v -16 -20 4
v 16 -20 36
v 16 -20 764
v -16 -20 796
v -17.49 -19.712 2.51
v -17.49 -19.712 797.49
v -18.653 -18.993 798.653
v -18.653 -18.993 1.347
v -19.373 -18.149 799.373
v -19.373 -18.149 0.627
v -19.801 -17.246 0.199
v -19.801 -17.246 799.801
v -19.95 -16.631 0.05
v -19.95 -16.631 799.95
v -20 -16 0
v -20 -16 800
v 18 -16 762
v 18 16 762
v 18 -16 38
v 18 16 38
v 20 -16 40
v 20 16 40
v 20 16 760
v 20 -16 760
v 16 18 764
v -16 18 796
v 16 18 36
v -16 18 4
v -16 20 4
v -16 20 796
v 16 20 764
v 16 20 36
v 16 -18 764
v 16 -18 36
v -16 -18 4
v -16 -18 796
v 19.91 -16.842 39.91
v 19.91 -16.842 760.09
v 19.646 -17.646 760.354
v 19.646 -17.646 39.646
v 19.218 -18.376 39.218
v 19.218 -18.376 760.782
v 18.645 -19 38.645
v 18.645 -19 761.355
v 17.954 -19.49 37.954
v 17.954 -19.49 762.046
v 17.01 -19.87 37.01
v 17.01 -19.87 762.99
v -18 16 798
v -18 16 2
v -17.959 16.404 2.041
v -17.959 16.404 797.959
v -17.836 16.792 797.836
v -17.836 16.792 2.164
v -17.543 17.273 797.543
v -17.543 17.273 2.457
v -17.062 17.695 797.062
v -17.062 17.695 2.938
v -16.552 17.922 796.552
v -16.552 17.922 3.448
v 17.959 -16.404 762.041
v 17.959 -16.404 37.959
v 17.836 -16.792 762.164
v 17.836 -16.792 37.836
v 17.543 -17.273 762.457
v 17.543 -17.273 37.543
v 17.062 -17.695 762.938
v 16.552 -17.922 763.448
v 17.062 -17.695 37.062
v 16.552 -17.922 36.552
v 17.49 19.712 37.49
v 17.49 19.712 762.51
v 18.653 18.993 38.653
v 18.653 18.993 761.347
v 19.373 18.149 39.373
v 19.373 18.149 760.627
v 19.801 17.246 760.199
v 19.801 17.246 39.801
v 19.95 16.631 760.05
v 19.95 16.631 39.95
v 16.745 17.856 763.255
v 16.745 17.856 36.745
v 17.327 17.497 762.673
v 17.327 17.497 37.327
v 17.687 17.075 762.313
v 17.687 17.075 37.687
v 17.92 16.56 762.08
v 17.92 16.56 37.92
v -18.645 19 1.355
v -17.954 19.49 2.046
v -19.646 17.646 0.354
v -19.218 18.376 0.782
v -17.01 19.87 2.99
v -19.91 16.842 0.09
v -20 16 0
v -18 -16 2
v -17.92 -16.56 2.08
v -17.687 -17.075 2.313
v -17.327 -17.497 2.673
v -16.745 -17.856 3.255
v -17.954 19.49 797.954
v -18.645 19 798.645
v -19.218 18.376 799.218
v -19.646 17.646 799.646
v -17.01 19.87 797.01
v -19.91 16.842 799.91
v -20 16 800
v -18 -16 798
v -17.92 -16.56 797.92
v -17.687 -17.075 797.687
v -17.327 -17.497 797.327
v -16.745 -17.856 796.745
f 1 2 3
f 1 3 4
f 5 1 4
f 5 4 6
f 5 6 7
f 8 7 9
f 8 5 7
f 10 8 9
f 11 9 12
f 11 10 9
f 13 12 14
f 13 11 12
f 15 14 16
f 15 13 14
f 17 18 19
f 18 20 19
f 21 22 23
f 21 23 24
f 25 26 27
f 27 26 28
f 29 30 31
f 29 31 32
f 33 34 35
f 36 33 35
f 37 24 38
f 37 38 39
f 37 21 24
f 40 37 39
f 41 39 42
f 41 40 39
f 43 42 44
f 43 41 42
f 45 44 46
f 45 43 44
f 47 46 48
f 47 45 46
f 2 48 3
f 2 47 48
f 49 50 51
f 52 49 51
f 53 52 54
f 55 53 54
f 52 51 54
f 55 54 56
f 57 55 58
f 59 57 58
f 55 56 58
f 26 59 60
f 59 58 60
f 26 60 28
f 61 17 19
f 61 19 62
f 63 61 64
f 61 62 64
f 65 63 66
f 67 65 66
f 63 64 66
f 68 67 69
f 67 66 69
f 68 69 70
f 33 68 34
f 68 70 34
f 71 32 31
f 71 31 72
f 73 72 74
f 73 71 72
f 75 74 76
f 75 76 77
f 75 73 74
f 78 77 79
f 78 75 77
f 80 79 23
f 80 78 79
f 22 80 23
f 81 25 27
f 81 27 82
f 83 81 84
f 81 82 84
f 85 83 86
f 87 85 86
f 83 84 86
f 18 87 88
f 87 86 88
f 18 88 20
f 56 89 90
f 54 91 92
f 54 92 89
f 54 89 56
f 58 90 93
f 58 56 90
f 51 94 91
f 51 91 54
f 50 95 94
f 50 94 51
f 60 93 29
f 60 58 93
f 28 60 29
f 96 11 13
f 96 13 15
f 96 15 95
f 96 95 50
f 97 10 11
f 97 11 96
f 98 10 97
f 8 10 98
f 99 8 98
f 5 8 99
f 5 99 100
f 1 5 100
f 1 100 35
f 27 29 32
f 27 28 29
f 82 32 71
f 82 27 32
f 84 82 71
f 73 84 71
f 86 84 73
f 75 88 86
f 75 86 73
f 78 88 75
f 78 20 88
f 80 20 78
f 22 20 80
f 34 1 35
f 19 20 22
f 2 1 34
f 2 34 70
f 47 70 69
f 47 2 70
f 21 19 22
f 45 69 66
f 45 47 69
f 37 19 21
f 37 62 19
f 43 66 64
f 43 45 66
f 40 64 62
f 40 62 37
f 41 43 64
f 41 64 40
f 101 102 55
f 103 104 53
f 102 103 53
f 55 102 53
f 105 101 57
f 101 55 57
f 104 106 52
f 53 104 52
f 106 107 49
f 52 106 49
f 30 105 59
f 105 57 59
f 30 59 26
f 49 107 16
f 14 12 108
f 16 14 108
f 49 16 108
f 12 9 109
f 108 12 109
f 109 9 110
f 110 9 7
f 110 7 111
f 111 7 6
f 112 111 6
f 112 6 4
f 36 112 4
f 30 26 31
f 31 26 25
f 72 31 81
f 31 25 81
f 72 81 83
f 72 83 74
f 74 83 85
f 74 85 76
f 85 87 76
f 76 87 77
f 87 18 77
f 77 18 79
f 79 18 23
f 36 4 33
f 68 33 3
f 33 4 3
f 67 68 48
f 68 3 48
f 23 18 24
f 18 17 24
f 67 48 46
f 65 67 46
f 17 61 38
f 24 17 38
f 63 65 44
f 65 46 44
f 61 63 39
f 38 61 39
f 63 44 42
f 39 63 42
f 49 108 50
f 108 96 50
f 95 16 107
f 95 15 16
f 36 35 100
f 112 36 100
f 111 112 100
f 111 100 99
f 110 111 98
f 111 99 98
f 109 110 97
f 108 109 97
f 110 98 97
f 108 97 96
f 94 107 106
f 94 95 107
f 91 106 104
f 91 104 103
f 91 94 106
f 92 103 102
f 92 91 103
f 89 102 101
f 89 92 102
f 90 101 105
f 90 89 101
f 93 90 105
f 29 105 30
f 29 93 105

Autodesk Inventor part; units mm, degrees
ref_plane "YZ Plane" through (0, 0, 0) normal (1, 0, 0) x (0, 1, 0)
ref_plane "Piano iniziale" through (0, 0, 0) normal (0, 0, 1) x (1, 0, 0)
ref_plane "Piano finale" through (0, 0, 800) normal (0, 0, 1) x (1, 0, 0)
sketch "Schizzo" plane through (0, 0, 0) normal (0, 0, 1) x (1, 0, 0)
  line L0 (-20, -16) -> (-20, 16)
  line L1 (-16, 20) -> (16, 20)
  line L2 (20, 16) -> (20, -16)
  line L3 (16, -20) -> (-16, -20)
  arc A0 (-20, -16) -> (-16, -20) centre (-16, -16) ccw
  arc A1 (20, 16) -> (16, 20) centre (16, 16) ccw
  arc A2 (-16, 20) -> (-20, 16) centre (-16, 16) ccw
  arc A3 (16, -20) -> (20, -16) centre (16, -16) ccw
  arc A4 (-16, 18) -> (-18, 16) centre (-16, 16) ccw
  line L4 (-16, 18) -> (16, 18)
  arc A5 (18, 16) -> (16, 18) centre (16, 16) ccw
  line L5 (18, 16) -> (18, -16)
  arc A6 (16, -18) -> (18, -16) centre (16, -16) ccw
  line L6 (16, -18) -> (-16, -18)
  arc A7 (-18, -16) -> (-16, -18) centre (-16, -16) ccw
  line L7 (-18, -16) -> (-18, 16)
  line L8 (0, 29.1598) -> (0, -29.1598) construction
  line L9 (-29.1598, 0) -> (29.1598, 0) construction
  dimension "d7" = 4
  dimension "d9" = 40
  dimension "d11" = 40
  dimension "d12" = 2
  dimension "d15" = 20
  dimension "d16" = 20
extrude "Corpo" add sketch "Schizzo" along normal up to surface (800 mm away) from surface at 0
sketch "Sketch3" plane through (0, 0, 0) normal (0, 0, 1) x (1, 0, 0)
  line L0 (0, 0) -> (10, 0)
ref_plane "Work Plane3" through (0, 0, 0) normal (0, -1, 0) x (1, 0, 0)
sketch "Sketch4" plane through (0, 0, 0) normal (0, -1, 0) x (1, 0, 0)
  line L0 (-2, 0) -> (12, 0)
  line L1 (-2, 800) -> (12, 800)
  dimension "d18" = 800
sketch "Schizzo5" plane through (-16, -20, 0) normal (0, -1, 0) x (1, 0, 0)
  line L0 (-4, 0) -> (-4, 800) projected
  line L1 (-4, 0) -> (0, 0) projected
  line L2 (-4, 800) -> (0, 800) projected
  line L3 (-4, 800) -> (0, 800) projected
  line L4 (-4, 800) -> (46.6766, 749.3234)
  line L5 (-4, 800) -> (67.6675, 800) construction
  line L6 (46.6766, 749.3234) -> (46.6766, 833.8871)
  line L7 (46.6766, 833.8871) -> (-4, 800)
  line L8 (-4, 0) -> (55.8193, 59.8193)
  line L9 (-4, 0) -> (80.5973, 0) construction
  line L10 (55.8193, 59.8193) -> (55.8193, -51.0015)
  line L11 (55.8193, -51.0015) -> (-4, 0)
  point P0 (16, 0)
  dimension "d19" = 45
  dimension "d20" = 45
extrude "Estrusione2" cut sketch "Schizzo5" against normal up to next
equation "\"d7\" = G_IR"
equation "\"d9\" = G_W"
equation "\"d11\" = G_H"
equation "\"d12\" = G_T"
equation "\"d15\" = 0.5 * d9"
equation "\"d16\" = 0.5 * d11"
equation "\"d3\" = G_L"
equation "\"G_W\" = 40"
equation "\"G_H\" = 40"
equation "\"G_T\" = 2"
equation "\"G_IR\" = 4"
equation "\"G_L\" = d18"
equation "\"G_OFFSET_START\" = 0"
equation "\"G_OFFSET_END\" = 0"
properties part number "ISO 10799-2 - 40x40x2 - 800" material "Acciaio, Dolce"
